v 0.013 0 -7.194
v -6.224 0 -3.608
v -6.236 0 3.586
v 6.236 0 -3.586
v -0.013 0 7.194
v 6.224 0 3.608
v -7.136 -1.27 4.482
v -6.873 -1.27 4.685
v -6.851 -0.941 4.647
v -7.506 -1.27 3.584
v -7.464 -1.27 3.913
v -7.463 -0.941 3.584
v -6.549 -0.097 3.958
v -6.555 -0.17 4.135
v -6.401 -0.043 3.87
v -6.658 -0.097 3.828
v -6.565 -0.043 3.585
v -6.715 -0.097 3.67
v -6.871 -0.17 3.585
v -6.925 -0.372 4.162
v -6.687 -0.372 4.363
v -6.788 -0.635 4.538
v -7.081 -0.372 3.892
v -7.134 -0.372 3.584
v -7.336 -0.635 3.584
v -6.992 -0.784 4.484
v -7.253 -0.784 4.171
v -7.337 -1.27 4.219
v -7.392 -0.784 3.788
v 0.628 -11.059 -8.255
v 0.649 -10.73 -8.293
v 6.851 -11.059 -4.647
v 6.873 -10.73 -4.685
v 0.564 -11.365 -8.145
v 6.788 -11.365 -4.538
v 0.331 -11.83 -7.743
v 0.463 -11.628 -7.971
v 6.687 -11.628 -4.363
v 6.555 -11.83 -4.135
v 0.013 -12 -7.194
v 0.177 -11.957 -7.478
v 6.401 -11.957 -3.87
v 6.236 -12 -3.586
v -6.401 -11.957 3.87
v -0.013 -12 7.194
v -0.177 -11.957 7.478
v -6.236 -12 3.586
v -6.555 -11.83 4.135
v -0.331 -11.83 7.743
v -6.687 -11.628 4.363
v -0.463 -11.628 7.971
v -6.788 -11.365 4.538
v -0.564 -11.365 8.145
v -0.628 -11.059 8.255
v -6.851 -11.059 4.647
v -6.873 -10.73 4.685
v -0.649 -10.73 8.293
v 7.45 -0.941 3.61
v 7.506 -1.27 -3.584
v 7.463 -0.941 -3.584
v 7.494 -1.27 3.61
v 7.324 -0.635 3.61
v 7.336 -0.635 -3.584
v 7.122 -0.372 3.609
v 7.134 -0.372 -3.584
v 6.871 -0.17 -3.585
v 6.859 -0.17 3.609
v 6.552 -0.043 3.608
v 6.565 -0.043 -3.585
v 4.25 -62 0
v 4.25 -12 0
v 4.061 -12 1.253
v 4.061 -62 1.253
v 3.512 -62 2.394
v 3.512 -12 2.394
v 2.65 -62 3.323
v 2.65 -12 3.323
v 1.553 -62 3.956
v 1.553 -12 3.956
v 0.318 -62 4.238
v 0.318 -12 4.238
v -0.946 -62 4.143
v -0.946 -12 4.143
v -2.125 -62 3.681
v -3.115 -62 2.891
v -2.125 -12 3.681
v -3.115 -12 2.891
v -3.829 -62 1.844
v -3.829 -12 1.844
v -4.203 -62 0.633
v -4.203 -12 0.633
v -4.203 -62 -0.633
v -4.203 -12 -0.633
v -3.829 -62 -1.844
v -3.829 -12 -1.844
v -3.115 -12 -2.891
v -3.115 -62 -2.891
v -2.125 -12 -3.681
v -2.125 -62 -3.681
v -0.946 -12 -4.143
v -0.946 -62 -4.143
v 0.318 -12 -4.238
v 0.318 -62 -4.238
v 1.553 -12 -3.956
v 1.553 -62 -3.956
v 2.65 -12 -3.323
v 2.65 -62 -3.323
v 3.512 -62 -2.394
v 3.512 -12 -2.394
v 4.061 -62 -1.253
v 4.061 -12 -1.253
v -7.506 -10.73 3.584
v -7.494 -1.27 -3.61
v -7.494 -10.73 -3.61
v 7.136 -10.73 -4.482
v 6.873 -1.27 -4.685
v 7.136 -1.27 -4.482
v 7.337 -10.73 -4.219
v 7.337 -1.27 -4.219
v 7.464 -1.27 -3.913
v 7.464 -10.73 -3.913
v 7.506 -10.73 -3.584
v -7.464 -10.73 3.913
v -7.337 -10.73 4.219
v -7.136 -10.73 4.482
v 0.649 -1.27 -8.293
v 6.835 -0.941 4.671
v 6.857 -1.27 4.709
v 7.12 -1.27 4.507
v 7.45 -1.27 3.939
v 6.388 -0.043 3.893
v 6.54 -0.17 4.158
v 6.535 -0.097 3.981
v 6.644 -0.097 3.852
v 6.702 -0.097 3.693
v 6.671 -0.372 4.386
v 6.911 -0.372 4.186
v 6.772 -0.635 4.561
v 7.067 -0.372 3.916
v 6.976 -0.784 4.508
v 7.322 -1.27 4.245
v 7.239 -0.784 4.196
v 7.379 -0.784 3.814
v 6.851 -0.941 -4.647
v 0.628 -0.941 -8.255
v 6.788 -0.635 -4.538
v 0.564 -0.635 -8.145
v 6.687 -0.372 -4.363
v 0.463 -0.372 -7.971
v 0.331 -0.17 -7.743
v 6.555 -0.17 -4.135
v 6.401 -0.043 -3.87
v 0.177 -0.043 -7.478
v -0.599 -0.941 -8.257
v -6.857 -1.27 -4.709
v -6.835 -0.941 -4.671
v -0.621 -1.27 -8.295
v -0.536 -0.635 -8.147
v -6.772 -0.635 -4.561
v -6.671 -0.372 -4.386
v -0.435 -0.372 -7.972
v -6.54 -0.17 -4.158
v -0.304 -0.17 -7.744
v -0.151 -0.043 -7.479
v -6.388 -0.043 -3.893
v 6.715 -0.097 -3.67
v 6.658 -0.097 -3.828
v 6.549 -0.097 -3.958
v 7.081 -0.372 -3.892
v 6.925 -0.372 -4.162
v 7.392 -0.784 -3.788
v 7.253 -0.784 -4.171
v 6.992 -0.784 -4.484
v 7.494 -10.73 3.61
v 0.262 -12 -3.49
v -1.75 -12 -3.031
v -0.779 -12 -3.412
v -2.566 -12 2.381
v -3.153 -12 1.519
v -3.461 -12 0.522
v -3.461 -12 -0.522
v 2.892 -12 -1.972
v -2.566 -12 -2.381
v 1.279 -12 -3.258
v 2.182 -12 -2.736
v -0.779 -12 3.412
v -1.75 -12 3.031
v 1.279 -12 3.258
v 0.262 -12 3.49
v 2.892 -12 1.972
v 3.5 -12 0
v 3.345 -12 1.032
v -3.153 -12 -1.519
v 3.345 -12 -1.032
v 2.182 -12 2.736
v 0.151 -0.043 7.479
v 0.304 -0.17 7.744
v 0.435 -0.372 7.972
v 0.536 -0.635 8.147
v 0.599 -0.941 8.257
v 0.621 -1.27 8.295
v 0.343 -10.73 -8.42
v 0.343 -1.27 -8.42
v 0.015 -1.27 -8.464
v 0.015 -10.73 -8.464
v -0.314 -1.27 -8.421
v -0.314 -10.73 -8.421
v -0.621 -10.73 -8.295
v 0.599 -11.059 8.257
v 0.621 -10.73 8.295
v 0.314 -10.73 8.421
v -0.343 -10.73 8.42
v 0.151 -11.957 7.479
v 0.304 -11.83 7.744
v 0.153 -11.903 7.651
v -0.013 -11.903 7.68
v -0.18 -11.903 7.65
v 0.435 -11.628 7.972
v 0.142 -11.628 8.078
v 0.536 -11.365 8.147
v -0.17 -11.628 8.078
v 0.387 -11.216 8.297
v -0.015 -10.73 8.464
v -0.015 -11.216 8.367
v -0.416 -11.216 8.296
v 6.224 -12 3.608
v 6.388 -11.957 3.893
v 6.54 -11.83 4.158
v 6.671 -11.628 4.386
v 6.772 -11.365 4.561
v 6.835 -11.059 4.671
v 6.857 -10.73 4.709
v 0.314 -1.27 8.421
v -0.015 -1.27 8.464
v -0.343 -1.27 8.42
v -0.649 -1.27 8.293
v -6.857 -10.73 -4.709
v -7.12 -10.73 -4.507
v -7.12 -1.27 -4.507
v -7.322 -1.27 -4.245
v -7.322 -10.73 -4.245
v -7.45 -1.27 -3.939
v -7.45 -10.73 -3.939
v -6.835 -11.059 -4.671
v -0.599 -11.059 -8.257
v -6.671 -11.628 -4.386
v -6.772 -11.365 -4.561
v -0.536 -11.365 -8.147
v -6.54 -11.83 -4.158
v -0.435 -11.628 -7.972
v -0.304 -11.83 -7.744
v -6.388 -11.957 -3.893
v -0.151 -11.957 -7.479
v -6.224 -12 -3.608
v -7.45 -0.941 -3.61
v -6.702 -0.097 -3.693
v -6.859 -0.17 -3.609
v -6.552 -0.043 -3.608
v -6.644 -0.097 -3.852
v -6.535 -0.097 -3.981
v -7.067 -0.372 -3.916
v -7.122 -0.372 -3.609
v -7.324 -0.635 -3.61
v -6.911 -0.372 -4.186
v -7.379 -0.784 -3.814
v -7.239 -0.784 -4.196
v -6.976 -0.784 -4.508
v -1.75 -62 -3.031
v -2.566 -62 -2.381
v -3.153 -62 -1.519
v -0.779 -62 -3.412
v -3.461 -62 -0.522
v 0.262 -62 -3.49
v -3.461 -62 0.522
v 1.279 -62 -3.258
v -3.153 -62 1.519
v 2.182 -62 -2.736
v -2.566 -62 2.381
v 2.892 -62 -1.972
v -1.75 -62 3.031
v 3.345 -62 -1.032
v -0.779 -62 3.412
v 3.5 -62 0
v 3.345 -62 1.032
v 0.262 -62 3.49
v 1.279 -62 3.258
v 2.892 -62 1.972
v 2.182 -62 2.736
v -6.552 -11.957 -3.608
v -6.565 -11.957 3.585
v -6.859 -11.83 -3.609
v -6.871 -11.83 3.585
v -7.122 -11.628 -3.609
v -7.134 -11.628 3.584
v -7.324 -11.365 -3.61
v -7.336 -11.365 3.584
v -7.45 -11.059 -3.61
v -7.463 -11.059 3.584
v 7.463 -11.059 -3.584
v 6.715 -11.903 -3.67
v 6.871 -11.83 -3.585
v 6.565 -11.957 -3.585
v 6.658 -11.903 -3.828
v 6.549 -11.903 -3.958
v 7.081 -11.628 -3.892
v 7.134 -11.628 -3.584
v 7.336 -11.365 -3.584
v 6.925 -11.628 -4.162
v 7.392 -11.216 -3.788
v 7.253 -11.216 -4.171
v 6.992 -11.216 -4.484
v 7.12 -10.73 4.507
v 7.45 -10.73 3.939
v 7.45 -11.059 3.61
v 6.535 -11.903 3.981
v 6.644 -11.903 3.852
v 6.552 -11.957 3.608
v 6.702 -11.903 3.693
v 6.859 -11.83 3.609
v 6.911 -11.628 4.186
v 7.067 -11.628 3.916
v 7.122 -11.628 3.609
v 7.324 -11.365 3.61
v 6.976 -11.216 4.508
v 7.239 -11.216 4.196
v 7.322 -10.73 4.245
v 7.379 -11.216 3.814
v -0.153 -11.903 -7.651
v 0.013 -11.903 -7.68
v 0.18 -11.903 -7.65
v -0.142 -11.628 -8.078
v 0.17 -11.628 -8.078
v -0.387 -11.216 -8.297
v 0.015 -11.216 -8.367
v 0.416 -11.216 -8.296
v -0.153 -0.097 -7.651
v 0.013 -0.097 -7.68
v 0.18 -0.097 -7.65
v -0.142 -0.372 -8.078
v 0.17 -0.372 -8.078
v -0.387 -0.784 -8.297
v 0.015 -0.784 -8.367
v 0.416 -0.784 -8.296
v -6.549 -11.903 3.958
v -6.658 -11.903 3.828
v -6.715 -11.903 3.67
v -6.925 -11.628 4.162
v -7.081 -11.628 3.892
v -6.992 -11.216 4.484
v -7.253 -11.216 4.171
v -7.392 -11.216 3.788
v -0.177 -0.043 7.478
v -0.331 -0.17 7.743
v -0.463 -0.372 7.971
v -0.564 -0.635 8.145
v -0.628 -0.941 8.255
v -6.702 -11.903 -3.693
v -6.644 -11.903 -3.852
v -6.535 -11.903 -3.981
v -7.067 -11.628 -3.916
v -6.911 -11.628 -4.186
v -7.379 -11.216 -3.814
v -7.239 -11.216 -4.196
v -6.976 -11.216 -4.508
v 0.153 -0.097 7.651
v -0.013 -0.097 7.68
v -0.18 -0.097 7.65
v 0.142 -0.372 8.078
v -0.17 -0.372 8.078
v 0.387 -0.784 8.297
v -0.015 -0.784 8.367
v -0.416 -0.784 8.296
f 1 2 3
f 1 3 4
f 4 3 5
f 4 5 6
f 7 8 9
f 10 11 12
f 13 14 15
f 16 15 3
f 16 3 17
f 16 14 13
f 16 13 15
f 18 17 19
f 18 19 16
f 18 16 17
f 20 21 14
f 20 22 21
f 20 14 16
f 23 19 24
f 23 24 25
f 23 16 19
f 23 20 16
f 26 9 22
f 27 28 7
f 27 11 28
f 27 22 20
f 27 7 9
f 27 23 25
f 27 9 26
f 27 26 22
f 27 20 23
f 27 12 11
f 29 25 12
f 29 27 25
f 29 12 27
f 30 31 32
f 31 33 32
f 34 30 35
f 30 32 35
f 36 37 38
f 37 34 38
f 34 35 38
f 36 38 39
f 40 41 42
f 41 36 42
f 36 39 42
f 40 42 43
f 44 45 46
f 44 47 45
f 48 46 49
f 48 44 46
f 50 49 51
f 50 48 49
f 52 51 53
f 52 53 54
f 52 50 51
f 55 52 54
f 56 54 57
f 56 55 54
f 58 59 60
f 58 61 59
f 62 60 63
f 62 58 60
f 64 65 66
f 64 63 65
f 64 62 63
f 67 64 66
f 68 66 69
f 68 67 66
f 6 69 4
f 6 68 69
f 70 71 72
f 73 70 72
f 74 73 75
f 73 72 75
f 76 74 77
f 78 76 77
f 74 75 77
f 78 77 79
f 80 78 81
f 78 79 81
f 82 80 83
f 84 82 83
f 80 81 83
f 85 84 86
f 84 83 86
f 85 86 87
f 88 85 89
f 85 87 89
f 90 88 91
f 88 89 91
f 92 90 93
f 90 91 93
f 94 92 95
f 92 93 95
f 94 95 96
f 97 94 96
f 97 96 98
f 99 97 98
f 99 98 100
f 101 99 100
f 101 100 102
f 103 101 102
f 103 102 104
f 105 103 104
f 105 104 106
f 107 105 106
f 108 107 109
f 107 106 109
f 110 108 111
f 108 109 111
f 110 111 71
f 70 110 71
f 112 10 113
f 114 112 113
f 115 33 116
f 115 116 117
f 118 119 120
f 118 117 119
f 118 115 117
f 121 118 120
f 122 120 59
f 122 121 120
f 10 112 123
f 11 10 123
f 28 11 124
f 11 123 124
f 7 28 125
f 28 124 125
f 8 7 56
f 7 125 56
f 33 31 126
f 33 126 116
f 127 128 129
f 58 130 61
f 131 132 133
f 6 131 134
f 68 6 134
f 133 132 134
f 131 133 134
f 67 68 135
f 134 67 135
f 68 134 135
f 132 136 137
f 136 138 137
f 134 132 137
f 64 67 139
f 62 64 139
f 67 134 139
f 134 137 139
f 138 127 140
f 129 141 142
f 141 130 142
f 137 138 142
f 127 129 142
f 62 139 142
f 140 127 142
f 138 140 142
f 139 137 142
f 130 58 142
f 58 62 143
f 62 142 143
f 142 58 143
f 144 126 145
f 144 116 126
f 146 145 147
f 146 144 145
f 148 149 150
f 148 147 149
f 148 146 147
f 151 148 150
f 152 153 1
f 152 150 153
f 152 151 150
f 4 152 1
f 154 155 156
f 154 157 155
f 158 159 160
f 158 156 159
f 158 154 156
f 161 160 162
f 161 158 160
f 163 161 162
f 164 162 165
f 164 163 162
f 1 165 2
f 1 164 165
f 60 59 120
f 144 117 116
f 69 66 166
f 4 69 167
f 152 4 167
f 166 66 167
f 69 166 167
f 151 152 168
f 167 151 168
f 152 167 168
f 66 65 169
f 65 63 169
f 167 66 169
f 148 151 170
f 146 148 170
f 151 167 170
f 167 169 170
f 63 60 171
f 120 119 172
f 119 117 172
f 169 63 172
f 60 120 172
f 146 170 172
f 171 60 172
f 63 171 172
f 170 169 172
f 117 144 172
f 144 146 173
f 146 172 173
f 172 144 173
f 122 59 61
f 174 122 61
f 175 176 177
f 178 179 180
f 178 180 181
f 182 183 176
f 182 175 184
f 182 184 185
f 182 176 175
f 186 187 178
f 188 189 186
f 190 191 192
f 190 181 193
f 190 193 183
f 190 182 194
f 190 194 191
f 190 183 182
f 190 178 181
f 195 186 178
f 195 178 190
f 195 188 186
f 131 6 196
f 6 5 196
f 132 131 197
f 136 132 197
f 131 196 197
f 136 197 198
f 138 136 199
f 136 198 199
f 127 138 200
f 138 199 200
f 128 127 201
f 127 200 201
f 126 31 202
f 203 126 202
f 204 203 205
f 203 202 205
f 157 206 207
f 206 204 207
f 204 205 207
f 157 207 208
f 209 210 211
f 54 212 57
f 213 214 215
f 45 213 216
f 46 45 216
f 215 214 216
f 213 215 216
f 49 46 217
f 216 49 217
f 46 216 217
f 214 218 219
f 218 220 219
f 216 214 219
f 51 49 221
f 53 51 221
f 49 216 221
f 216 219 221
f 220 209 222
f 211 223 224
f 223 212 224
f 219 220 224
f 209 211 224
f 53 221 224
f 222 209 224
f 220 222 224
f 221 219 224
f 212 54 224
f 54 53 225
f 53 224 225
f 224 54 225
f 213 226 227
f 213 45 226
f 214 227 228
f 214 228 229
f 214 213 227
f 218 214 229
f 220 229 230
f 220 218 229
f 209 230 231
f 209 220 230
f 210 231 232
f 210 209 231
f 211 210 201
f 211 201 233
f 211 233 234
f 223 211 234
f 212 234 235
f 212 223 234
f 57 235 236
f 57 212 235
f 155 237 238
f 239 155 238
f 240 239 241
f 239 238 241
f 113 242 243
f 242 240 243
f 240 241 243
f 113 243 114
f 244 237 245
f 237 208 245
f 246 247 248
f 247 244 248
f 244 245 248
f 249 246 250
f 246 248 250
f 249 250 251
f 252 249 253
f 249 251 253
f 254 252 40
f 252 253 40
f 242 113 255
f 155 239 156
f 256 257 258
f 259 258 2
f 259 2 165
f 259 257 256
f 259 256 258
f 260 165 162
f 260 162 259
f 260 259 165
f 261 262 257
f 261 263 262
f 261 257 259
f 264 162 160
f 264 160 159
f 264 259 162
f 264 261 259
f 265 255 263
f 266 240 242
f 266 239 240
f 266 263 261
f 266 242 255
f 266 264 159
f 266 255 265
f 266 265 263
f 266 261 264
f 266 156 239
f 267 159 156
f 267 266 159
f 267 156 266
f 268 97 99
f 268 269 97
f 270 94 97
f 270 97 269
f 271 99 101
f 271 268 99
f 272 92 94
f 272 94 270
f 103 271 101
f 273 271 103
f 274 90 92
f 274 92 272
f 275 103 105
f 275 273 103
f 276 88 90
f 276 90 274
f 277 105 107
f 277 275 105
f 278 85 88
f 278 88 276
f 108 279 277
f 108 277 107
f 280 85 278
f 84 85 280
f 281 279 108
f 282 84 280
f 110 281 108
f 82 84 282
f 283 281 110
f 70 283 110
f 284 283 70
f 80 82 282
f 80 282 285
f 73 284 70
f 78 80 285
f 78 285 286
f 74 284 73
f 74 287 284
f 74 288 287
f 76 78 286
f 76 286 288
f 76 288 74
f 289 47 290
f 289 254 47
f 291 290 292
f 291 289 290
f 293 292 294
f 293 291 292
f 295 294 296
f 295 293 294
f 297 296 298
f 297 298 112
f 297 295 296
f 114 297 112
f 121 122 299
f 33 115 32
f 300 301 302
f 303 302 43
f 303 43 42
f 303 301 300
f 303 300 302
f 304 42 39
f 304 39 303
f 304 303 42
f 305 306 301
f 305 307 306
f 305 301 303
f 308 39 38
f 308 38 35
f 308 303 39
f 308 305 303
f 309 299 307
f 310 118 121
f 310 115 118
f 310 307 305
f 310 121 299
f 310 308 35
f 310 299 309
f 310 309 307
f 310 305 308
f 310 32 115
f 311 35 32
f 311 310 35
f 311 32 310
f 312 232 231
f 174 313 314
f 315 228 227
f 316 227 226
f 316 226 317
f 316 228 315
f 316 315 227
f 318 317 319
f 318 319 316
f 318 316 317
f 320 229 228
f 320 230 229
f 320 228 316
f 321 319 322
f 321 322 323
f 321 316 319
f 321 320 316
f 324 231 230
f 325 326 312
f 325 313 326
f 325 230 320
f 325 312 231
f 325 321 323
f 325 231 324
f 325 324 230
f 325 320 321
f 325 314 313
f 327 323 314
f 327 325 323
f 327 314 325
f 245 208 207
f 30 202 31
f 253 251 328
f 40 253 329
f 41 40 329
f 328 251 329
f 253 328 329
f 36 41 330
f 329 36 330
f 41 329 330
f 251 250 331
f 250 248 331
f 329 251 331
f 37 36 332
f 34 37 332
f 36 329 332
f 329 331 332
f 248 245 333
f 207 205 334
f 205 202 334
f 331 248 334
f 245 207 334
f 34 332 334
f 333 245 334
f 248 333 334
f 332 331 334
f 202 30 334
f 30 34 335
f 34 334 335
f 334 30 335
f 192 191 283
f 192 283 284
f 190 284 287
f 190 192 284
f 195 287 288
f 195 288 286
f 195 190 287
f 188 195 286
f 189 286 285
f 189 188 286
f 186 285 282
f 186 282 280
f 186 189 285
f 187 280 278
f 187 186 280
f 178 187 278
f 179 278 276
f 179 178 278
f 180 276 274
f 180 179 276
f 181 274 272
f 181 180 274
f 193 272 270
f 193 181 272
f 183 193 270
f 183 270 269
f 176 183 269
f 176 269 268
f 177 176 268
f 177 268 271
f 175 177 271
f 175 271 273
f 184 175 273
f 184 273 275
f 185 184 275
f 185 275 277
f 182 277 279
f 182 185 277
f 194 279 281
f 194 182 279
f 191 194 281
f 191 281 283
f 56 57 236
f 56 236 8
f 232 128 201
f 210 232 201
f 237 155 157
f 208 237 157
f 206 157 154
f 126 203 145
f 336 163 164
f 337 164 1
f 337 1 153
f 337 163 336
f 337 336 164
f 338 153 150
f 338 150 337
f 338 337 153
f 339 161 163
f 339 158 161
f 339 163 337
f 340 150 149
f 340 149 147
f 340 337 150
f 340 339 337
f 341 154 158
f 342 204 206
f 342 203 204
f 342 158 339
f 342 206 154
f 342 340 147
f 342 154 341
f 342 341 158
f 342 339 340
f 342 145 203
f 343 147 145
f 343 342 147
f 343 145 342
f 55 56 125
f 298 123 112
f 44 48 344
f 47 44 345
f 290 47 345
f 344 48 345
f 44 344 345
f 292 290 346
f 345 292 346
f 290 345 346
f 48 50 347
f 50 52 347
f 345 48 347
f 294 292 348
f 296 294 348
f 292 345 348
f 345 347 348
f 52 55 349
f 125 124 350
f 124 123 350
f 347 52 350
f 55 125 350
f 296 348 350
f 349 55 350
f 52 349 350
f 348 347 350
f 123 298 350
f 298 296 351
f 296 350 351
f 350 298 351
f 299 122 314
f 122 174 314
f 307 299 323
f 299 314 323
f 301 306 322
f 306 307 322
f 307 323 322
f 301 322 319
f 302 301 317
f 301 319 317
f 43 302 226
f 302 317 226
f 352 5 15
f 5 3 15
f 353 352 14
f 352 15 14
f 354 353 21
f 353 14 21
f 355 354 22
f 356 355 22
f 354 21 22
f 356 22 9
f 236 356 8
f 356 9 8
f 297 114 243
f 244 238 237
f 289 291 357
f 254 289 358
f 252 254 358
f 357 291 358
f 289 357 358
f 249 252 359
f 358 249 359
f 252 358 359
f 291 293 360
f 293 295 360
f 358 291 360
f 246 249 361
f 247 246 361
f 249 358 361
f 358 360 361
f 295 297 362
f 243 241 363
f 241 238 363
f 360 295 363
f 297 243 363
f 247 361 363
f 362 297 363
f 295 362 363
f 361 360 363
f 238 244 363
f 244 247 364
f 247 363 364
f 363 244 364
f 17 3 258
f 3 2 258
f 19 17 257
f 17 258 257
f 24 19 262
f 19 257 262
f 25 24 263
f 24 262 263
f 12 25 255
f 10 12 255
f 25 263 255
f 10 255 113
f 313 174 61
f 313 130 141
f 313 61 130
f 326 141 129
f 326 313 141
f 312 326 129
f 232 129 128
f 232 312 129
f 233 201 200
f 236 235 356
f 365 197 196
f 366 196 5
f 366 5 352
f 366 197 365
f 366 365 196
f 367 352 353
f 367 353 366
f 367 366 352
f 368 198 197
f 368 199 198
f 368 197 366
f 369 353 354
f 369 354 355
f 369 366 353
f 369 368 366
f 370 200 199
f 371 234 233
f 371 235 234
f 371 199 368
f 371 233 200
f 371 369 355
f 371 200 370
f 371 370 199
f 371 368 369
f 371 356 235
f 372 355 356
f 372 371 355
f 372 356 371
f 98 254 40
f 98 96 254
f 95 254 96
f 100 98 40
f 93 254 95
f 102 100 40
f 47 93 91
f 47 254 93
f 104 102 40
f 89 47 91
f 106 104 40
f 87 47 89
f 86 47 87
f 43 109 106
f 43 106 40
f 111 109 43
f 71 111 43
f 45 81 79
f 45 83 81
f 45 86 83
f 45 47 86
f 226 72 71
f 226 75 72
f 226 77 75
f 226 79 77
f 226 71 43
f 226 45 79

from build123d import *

# Parameters (mm, degrees)
F1_DEPTH = 12
F2_R     = 4.25
F2_R_2   = 3.5
F3_DEPTH = 50
F4_R     = 1.27


with BuildPart() as f1:
    # F0 (on Front) → F1 (new body)
    with BuildSketch(Plane.XZ):
        Polygon((0.015132, -8.660241), (7.507554, -4.317016), (7.492423, 4.343225), (-0.015132, 8.660241), (-7.507554, 4.317016), (-7.492423, -4.343225), align=None)
    extrude(amount=F1_DEPTH)

    # F2 (on face) → F3 (join)
    with BuildSketch(Plane.XZ.offset(12)):
        Circle(F2_R)
        Circle(F2_R_2, mode=Mode.SUBTRACT)
    extrude(amount=F3_DEPTH)

    # F4
    f4_edges = [f1.edges().sort_by_distance(p)[0] for p in [
        (7.492423, -6, 4.343225),
        (-0.015132, -6, 8.660241),
        (3.738645, 0, 6.501733),
        (3.738645, -12, 6.501733),
        (7.507554, -6, -4.317016),
        (7.499989, 0, 0.013105),
        (7.499989, -12, 0.013105),
        (-7.507554, -6, 4.317016),
        (-3.761343, 0, 6.488628),
        (-3.761343, -12, 6.488628),
        (-7.492423, -6, -4.343225),
        (-7.499989, 0, -0.013105),
        (-7.499989, -12, -0.013105),
        (0.015132, -6, -8.660241),
        (-3.738645, 0, -6.501733),
        (-3.738645, -12, -6.501733),
        (3.761343, 0, -6.488628),
        (3.761343, -12, -6.488628),
    ]]
    fillet(f4_edges, radius=F4_R)


solid = f1.part
